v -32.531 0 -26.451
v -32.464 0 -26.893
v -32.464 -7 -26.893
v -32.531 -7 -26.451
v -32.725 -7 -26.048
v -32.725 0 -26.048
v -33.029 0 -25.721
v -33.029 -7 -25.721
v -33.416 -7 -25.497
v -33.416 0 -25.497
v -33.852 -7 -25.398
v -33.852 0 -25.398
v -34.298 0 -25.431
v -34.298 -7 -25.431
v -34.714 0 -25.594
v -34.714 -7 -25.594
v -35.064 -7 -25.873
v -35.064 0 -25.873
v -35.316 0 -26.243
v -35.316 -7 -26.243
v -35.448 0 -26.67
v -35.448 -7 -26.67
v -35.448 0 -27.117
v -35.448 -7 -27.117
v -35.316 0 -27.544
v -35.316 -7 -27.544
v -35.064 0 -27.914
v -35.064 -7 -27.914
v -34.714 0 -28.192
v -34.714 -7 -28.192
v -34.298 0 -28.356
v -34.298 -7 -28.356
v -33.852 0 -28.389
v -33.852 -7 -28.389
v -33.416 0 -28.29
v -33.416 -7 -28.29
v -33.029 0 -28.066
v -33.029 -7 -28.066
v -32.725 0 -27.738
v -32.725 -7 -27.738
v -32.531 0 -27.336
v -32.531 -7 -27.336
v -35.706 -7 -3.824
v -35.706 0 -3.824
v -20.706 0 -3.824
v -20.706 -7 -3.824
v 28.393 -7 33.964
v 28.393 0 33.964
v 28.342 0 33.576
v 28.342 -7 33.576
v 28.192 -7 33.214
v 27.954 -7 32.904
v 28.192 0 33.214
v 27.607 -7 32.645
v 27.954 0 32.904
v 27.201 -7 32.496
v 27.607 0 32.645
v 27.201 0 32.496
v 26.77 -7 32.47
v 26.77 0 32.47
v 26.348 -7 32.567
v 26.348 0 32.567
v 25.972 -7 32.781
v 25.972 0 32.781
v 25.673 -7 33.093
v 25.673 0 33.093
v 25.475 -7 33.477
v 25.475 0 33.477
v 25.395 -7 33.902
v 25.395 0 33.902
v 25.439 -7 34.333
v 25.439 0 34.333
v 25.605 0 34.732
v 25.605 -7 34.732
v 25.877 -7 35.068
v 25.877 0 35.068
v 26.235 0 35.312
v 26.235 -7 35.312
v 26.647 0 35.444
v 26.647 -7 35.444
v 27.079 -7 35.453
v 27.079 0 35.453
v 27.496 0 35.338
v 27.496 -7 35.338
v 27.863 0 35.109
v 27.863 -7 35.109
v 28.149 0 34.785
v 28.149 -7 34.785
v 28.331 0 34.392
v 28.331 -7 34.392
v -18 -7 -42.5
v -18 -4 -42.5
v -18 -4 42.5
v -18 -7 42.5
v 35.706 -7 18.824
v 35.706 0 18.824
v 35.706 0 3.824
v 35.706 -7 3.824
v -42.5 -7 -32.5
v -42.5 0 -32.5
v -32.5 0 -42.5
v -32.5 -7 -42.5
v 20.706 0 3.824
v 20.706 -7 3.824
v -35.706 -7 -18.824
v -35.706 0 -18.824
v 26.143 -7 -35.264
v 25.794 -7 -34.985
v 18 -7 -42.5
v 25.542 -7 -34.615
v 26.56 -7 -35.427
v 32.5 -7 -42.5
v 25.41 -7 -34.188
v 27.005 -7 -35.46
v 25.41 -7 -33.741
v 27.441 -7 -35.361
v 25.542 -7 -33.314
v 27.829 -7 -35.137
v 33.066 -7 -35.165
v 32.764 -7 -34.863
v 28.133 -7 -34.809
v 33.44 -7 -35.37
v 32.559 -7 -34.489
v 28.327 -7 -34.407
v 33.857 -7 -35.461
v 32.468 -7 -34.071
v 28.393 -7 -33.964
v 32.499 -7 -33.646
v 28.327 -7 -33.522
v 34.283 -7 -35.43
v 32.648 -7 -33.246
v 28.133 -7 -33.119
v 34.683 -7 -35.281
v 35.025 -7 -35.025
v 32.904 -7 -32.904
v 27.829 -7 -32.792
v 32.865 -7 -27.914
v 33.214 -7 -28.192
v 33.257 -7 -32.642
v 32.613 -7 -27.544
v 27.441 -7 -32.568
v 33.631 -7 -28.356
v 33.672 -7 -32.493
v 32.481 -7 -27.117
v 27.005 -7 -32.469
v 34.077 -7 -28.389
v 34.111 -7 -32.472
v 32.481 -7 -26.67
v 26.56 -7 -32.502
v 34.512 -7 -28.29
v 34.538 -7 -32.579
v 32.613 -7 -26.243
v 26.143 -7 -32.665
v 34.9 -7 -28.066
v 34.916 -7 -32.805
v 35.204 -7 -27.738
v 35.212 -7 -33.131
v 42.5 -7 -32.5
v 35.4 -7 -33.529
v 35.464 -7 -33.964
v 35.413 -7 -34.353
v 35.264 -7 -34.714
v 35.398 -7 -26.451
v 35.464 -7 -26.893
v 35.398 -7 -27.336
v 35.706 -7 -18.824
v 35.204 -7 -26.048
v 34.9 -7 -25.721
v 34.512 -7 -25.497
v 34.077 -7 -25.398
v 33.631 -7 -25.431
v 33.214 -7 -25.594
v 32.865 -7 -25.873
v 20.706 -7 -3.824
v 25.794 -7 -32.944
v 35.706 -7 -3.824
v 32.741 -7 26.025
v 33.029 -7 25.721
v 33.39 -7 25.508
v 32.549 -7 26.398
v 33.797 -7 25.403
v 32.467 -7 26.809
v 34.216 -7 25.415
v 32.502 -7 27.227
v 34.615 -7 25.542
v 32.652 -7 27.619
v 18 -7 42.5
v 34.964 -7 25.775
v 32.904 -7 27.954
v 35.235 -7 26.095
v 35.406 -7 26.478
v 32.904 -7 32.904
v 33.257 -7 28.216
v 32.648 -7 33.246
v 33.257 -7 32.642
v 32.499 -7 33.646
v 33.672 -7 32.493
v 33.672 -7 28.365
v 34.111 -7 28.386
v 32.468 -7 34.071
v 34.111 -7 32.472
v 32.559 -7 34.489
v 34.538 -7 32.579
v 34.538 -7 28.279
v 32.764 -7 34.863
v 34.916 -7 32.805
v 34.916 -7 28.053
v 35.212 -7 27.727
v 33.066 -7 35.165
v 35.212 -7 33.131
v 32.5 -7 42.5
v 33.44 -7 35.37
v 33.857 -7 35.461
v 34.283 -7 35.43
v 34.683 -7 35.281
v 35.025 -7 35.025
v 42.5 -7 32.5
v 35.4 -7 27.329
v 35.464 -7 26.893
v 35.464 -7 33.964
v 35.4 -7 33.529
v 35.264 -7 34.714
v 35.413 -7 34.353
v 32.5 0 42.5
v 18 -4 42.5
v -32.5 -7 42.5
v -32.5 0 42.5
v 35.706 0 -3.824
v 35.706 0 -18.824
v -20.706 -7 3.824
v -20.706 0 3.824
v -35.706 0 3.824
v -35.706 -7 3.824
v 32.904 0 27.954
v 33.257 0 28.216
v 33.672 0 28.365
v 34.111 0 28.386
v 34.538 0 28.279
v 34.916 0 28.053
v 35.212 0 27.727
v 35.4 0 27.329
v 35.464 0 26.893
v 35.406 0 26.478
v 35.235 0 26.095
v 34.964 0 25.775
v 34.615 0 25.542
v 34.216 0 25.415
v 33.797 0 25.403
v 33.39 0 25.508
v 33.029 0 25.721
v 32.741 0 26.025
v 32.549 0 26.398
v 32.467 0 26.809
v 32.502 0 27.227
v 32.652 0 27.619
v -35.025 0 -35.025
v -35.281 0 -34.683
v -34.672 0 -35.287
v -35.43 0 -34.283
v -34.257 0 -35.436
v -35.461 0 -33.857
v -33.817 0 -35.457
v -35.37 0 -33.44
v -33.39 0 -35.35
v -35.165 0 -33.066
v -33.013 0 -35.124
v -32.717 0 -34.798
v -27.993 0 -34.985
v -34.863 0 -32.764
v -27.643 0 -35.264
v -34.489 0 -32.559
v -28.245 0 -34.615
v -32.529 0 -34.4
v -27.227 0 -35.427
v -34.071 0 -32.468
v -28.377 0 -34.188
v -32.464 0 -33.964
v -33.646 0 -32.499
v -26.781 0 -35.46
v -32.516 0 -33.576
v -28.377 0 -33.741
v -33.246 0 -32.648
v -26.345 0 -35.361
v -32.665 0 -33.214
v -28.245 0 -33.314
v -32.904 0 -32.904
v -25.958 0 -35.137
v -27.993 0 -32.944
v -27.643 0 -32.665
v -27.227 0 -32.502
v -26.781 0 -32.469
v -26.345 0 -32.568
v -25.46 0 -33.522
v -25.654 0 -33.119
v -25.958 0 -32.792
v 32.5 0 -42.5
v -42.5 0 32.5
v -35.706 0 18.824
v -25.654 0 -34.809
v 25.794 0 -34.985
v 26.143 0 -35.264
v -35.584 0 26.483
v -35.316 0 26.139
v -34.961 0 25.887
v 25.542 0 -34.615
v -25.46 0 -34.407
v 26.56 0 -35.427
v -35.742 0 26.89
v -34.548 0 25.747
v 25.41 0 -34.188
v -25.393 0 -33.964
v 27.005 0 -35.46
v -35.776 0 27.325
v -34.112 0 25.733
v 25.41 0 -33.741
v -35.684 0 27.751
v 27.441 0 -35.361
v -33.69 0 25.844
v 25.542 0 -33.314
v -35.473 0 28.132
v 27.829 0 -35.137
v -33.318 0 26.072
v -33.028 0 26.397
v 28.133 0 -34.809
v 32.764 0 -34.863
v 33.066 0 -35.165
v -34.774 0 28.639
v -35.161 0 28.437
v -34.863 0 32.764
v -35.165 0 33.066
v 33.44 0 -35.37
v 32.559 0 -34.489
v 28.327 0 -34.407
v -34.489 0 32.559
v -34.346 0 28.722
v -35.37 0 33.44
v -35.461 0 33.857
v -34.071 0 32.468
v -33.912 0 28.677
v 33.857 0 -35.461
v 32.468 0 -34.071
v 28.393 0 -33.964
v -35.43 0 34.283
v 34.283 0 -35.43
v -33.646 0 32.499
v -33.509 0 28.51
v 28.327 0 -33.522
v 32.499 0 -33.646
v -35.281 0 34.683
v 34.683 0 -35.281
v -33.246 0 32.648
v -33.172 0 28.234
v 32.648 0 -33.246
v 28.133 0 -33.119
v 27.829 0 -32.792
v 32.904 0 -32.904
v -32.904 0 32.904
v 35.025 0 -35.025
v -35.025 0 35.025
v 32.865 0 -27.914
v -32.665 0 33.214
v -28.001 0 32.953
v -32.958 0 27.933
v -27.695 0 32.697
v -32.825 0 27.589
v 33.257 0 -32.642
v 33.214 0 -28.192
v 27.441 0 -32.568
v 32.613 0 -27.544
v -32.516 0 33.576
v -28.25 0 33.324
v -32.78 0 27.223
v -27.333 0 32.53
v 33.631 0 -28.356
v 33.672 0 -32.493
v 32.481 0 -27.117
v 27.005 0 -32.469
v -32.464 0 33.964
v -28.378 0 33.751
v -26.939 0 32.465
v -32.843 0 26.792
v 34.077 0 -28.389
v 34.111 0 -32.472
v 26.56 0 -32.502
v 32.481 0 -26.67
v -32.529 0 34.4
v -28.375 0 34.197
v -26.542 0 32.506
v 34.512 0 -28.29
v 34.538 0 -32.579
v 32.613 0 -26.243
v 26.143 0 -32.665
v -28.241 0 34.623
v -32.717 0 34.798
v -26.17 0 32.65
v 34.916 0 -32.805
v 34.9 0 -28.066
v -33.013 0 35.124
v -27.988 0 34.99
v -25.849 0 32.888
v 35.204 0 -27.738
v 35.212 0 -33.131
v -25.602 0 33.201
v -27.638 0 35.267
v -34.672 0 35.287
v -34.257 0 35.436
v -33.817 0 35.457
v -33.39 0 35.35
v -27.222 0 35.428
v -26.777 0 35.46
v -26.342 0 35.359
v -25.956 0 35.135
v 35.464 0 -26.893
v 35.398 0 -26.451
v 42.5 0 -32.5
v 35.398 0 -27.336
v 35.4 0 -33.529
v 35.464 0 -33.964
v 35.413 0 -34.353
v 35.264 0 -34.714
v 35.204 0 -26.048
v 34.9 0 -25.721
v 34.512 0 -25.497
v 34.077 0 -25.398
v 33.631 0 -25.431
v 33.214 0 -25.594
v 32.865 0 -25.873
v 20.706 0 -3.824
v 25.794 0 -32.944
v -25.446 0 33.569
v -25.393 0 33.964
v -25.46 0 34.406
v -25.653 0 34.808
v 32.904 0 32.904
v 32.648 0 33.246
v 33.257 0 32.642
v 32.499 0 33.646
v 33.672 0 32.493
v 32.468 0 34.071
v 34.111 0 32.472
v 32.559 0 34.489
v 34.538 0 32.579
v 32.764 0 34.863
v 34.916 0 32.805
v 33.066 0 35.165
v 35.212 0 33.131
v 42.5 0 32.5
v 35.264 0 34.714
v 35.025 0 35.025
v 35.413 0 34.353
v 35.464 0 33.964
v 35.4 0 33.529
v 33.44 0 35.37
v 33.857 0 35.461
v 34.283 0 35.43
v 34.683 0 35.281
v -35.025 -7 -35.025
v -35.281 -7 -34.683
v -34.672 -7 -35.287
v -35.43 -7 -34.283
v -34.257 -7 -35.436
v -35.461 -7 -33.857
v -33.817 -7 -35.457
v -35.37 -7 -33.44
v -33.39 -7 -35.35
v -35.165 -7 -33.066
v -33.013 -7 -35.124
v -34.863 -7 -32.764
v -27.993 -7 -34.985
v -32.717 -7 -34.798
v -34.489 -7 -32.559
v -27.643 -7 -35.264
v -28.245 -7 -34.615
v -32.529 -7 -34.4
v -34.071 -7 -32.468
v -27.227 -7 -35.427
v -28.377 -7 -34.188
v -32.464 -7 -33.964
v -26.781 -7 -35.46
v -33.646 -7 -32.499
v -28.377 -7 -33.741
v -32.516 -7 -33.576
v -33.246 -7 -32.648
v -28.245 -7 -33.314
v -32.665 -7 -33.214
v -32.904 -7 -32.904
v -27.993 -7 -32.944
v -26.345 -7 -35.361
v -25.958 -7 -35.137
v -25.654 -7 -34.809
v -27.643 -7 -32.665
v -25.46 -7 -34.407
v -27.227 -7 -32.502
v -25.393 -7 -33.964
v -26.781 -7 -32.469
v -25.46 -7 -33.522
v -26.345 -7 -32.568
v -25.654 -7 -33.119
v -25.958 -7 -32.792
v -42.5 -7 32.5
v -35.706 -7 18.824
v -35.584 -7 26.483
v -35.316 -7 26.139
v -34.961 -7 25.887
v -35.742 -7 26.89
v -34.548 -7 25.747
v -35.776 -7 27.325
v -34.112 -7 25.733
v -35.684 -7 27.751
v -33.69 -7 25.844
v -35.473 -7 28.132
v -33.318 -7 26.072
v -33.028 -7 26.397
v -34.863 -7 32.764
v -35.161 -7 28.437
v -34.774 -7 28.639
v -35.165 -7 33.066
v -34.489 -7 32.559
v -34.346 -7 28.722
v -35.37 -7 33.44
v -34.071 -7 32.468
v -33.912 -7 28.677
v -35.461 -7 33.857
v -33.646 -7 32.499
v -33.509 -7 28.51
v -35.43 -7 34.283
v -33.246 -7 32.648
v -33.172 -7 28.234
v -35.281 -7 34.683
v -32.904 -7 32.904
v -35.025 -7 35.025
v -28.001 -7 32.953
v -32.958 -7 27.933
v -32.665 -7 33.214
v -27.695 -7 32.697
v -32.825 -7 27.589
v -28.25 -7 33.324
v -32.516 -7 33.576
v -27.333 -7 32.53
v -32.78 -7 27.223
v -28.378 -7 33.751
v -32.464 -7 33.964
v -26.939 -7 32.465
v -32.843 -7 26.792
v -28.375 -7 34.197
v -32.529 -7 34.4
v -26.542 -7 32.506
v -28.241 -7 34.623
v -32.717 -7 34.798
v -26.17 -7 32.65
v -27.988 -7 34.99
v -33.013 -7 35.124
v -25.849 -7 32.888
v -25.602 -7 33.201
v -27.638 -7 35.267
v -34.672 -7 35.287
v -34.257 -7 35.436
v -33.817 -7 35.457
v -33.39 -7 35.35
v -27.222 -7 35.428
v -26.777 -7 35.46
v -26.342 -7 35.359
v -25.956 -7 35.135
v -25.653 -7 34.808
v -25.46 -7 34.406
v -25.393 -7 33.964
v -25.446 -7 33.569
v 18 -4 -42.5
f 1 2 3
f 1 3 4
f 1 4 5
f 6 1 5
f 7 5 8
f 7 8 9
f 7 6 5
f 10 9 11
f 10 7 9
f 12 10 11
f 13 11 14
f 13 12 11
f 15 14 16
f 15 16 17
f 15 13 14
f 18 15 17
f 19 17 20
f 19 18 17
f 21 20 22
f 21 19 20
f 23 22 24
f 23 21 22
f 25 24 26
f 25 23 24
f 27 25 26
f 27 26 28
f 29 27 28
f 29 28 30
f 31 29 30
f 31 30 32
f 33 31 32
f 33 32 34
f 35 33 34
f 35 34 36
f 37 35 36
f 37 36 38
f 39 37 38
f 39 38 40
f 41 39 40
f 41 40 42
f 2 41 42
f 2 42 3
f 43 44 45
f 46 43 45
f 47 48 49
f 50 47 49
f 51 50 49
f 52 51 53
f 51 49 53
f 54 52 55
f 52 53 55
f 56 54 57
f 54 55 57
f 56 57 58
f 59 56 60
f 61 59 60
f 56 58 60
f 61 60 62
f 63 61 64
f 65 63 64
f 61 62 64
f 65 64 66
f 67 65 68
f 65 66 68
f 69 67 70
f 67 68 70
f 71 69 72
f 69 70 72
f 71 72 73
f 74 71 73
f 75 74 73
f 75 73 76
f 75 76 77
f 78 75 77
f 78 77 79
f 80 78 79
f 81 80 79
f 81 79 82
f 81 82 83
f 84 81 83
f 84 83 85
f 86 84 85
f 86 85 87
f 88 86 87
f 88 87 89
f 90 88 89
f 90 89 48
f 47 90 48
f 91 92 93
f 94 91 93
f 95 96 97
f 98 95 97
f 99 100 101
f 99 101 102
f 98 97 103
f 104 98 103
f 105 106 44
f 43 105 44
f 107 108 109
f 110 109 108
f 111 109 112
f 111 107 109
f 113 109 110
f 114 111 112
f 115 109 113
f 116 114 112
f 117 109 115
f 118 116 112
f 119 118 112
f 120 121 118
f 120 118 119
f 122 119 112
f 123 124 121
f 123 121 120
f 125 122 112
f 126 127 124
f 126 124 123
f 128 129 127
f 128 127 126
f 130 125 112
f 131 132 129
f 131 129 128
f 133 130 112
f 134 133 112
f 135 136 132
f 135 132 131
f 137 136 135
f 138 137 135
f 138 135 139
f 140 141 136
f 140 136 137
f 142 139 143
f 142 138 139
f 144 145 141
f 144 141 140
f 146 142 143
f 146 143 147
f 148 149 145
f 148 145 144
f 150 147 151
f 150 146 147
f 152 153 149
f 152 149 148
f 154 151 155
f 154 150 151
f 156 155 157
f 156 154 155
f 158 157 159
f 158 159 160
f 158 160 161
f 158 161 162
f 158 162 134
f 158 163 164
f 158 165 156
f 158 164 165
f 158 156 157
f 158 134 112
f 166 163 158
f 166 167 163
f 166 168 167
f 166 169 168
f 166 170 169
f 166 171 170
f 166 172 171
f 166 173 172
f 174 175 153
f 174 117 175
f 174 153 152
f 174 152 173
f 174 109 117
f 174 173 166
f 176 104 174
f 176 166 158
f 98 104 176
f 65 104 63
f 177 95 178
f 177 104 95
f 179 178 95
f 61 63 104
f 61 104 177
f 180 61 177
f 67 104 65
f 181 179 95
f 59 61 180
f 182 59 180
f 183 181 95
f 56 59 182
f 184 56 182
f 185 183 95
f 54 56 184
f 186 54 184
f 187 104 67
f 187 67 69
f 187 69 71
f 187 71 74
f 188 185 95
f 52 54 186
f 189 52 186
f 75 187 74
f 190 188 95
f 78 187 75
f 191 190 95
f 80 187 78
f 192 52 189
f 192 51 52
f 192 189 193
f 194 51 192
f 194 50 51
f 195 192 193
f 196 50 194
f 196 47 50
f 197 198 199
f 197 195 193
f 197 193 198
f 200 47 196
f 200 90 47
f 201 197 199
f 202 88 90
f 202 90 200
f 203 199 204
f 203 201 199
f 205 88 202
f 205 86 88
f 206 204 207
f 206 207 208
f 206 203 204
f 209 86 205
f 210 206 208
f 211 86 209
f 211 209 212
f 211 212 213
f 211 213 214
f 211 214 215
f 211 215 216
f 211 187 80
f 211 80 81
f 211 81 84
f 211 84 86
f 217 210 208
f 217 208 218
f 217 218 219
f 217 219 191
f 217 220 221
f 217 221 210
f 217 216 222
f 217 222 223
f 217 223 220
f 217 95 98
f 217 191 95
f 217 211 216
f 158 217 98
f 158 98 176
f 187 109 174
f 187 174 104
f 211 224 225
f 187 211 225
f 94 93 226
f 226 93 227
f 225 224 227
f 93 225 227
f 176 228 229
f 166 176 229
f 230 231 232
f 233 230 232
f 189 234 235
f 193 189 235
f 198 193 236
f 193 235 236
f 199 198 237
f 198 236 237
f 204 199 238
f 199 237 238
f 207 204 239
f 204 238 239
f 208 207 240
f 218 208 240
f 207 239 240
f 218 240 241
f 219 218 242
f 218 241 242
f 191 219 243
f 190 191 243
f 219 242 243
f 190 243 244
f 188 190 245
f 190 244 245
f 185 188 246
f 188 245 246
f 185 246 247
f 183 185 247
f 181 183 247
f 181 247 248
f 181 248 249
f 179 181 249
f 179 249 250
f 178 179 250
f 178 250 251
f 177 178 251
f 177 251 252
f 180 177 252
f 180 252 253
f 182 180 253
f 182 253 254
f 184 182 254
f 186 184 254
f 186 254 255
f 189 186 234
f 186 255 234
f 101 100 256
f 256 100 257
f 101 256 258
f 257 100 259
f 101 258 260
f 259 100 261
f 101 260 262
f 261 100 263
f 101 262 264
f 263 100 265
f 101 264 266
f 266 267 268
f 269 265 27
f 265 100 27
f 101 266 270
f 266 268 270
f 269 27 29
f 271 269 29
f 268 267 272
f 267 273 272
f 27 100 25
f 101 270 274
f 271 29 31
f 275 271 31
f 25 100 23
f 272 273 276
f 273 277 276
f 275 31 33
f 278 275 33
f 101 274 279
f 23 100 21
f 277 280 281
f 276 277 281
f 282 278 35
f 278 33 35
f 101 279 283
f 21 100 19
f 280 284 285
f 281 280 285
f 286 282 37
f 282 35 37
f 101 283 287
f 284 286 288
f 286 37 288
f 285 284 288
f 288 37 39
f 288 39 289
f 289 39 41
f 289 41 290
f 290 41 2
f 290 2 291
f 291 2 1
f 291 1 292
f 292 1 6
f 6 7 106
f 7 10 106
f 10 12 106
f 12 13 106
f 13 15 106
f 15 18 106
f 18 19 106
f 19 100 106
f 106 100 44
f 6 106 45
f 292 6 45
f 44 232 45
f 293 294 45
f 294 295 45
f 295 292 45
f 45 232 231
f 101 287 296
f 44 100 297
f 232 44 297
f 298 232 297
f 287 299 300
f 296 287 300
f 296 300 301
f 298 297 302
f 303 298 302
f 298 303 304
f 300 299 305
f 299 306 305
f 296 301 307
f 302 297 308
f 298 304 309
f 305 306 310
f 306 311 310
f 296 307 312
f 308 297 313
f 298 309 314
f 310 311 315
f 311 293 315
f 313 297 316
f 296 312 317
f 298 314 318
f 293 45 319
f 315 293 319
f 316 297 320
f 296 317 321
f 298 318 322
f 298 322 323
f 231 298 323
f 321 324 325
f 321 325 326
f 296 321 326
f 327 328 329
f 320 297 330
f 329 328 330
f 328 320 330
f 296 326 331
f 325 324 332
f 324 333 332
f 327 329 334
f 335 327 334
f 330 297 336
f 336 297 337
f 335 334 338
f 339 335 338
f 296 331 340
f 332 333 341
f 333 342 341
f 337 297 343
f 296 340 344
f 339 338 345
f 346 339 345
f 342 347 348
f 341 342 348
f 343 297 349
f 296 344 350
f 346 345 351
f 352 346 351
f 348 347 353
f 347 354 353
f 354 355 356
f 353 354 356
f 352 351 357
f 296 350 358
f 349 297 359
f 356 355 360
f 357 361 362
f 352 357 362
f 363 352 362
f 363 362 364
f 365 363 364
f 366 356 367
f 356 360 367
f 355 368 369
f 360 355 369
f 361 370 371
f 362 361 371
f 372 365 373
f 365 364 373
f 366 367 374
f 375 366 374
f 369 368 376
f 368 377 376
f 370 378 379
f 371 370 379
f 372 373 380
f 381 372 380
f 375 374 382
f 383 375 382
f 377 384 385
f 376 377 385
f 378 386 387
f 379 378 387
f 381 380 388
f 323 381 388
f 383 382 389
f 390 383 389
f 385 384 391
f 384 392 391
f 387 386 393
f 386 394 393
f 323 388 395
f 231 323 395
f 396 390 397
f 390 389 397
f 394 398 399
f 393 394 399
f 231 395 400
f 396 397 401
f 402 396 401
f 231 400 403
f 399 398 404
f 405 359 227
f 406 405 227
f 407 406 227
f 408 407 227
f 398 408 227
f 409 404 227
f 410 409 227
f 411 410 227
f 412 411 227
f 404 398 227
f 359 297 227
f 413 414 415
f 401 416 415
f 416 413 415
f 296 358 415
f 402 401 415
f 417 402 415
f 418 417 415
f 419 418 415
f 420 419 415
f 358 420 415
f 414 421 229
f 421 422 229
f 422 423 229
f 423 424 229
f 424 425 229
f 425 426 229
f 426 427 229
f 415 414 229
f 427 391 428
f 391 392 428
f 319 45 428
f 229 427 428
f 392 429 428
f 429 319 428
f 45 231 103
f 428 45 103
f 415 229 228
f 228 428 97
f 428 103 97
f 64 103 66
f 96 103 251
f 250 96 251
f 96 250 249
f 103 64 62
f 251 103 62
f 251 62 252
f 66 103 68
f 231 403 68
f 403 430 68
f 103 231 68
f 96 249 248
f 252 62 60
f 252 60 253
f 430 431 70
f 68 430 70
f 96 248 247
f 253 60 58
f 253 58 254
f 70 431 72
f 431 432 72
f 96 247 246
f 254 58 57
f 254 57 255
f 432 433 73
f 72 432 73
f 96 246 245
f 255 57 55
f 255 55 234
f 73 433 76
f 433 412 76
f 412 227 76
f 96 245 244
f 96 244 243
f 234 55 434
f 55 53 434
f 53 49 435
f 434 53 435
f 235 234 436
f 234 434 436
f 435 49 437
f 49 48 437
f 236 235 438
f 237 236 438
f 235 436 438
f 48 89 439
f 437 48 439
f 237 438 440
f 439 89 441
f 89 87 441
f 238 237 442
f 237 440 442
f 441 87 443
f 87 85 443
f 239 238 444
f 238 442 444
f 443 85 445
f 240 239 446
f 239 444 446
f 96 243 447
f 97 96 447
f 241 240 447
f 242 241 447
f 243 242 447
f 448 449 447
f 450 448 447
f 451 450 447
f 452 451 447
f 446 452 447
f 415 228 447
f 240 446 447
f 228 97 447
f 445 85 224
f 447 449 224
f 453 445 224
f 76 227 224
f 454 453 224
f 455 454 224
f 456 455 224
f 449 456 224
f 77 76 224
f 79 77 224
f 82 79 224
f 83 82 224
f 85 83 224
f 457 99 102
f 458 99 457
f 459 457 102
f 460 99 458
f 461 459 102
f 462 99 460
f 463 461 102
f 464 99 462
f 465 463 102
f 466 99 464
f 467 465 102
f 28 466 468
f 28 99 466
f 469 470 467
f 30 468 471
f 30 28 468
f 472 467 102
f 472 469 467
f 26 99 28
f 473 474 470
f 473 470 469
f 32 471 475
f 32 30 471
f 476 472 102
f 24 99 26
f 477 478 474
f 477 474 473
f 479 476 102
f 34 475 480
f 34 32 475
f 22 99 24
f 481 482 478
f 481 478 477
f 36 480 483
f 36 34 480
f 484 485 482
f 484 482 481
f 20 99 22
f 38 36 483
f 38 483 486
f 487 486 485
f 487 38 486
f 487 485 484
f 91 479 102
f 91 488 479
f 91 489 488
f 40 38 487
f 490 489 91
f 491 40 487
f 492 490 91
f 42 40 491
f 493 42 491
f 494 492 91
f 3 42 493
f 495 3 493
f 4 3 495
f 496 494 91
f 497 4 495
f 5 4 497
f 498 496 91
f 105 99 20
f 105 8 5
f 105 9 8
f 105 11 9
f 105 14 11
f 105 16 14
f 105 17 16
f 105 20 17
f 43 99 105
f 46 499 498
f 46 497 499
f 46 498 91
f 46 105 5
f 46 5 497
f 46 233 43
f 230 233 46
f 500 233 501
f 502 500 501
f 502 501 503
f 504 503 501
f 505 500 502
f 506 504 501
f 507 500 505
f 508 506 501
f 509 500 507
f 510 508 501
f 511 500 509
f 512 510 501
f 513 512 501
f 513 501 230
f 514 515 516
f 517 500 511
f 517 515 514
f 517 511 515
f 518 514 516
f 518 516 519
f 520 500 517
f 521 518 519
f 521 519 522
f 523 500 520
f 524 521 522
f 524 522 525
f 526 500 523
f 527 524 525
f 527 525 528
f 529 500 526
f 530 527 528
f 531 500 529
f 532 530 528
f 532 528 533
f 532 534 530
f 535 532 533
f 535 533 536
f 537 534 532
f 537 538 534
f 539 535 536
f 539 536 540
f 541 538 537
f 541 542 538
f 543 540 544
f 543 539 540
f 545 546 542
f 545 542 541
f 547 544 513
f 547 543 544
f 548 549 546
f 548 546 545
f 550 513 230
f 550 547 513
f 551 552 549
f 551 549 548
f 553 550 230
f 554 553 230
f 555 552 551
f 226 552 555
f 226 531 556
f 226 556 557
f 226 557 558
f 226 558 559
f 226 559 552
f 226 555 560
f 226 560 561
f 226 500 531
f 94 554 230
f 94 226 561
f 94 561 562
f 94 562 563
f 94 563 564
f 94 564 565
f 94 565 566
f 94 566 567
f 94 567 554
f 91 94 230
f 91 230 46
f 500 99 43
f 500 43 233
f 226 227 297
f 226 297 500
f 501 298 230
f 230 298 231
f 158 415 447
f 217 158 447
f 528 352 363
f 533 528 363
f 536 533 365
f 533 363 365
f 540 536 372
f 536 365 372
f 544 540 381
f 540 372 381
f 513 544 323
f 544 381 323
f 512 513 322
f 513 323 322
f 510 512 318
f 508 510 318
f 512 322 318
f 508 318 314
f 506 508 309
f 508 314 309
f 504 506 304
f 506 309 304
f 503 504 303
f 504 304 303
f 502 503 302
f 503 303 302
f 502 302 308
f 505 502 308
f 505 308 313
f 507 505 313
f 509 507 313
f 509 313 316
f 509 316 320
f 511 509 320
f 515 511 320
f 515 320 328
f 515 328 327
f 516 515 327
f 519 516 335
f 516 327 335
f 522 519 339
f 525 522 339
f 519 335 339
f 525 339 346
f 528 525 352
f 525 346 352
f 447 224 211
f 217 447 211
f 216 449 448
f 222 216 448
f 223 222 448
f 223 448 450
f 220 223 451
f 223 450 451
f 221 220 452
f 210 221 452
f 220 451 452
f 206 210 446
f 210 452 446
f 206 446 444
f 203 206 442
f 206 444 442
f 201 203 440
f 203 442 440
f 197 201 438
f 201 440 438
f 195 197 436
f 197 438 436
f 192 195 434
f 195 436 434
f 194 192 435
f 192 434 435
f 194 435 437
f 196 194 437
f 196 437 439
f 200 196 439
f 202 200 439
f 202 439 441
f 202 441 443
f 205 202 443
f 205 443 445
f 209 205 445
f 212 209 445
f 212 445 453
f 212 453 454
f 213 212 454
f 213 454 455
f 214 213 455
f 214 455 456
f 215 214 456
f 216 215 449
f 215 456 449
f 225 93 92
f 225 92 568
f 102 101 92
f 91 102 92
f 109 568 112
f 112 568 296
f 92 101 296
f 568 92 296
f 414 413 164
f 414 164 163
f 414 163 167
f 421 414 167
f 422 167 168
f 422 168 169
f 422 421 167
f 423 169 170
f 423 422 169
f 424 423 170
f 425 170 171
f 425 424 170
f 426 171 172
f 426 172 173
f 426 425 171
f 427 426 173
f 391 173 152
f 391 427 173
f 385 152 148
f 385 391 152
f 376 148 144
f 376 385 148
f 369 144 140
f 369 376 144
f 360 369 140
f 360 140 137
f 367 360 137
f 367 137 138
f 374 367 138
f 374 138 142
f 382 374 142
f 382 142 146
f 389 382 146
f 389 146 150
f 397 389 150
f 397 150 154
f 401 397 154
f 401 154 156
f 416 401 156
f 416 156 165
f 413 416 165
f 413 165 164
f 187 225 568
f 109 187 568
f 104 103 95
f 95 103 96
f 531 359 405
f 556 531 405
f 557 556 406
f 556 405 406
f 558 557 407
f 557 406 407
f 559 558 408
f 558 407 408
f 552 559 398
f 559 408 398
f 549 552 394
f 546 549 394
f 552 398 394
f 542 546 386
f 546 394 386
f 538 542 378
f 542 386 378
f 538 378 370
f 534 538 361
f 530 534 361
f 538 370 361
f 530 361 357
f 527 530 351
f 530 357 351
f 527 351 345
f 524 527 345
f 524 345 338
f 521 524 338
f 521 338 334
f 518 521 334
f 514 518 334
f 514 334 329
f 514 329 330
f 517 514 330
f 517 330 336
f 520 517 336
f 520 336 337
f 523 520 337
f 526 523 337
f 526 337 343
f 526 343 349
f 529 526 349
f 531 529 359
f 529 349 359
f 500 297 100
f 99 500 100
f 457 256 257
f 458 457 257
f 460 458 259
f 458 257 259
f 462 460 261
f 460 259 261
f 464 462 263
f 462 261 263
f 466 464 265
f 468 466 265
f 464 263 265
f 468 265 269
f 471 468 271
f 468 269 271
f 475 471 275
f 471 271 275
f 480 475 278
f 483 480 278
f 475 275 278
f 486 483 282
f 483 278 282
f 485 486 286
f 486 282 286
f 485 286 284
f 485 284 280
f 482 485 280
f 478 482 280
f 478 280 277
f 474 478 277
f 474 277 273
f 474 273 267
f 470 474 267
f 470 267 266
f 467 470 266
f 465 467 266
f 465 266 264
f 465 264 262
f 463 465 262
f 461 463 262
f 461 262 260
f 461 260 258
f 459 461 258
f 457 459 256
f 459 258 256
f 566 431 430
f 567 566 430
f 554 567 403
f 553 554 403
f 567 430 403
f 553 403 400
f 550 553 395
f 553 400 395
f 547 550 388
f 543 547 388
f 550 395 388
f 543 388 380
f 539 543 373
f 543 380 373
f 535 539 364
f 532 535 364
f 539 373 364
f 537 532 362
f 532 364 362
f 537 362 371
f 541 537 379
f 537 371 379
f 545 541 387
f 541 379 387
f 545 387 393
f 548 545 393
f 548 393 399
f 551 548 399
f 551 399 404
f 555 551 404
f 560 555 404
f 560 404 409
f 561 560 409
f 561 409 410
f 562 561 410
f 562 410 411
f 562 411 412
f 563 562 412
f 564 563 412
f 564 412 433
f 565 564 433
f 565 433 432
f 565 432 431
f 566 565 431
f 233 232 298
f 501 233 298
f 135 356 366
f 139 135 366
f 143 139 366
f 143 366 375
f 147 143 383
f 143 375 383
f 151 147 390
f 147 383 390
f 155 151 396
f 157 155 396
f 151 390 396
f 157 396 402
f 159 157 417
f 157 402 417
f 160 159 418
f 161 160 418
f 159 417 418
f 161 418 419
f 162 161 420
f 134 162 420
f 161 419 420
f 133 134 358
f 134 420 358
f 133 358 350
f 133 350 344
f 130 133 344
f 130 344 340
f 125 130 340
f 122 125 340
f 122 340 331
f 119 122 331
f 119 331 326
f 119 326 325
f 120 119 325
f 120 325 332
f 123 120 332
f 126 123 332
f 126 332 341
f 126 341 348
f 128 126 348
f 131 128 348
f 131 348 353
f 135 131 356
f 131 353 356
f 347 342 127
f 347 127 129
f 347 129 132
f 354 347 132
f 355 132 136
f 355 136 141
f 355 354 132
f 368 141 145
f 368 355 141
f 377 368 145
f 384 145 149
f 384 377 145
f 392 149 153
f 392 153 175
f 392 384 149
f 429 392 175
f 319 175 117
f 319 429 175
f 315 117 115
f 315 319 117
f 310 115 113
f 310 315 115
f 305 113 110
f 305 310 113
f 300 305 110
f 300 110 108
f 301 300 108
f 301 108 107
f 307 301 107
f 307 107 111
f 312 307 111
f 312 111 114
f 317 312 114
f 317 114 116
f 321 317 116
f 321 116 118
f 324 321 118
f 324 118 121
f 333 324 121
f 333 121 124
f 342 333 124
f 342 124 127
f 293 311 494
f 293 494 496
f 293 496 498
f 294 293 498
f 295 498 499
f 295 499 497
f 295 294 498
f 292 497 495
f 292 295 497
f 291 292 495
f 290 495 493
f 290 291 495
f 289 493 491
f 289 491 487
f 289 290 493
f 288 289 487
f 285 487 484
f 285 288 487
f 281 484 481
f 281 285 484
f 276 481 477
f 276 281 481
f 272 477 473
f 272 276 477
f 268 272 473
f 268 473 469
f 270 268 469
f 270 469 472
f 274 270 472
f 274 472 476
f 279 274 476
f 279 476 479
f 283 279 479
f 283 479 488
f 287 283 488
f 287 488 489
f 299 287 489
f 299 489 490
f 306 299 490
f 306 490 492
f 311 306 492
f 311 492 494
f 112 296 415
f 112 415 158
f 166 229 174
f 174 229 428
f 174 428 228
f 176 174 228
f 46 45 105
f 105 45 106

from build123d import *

# Parameters (mm, degrees)
F0_R     = 1.5
F0_W     = 36
F0_H     = 85
F1_DEPTH = 4
F2_SIZE  = 10
F3_DEPTH = 7


with BuildPart() as f1:
    # F0 (on Front) → F1 (new body)
    with BuildSketch(Plane.XZ):
        Polygon((42.5, 32.5), (42.5, 42.5), (37.5, 37.5), align=None)
        Polygon((37.5, 37.5), (42.5, 42.5), (32.5, 42.5), align=None)
        Polygon((42.5, -32.5), (42.5, 32.5), (37.5, 37.5), (32.5, 42.5), (18, 42.5), (18, -42.5), (32.5, -42.5), (37.5, -37.5), align=None)
        with Locations((26.8933982822, -33.9644660941)):
            Circle(F0_R, mode=Mode.SUBTRACT)
        with BuildLine():
            ThreePointArc((35.4644660941, -33.9644660941), (35.3502853928, -34.5384912426), (35.0251262658, -35.0251262658))
            ThreePointArc((35.0251262658, -35.0251262658), (32.9038059223, -35.0251262658), (32.9038059223, -32.9038059223))
            ThreePointArc((32.9038059223, -32.9038059223), (34.5384912426, -32.5786467953), (35.4644660941, -33.9644660941))
        make_face(mode=Mode.SUBTRACT)
        with Locations((33.9644660941, -26.8933982822)):
            Circle(F0_R, mode=Mode.SUBTRACT)
        Polygon((20.7055291533, -3.823871389), (35.7055291533, -3.823871389), (35.7055291533, -18.823871389), align=None, mode=Mode.SUBTRACT)
        Polygon((35.7055291533, 3.823871389), (20.7055291533, 3.823871389), (35.7055291533, 18.823871389), align=None, mode=Mode.SUBTRACT)
        with BuildLine():
            ThreePointArc((35.4644660941, 26.8933982822), (33.3904409455, 25.5075789834), (32.9038059223, 27.954058454))
            ThreePointArc((32.9038059223, 27.954058454), (34.5384912426, 28.279217581), (35.4644660941, 26.8933982822))
        make_face(mode=Mode.SUBTRACT)
        with BuildLine():
            ThreePointArc((28.3933982822, 33.9644660941), (28.279217581, 33.3904409455), (27.954058454, 32.9038059223))
            ThreePointArc((27.954058454, 32.9038059223), (25.5075789834, 34.5384912426), (28.3933982822, 33.9644660941))
        make_face(mode=Mode.SUBTRACT)
        with BuildLine():
            ThreePointArc((32.9038059223, 32.9038059223), (32.9038059223, 35.0251262658), (35.0251262658, 35.0251262658))
            ThreePointArc((35.0251262658, 35.0251262658), (35.3502853928, 34.5384912426), (35.4644660941, 33.9644660941))
            ThreePointArc((35.4644660941, 33.9644660941), (34.5384912426, 32.5786467953), (32.9038059223, 32.9038059223))
        make_face(mode=Mode.SUBTRACT)
        Polygon((42.5, -42.5), (42.5, -32.5), (37.5, -37.5), align=None)
        Rectangle(F0_W, F0_H)
        Polygon((32.5, -42.5), (42.5, -42.5), (37.5, -37.5), align=None)
        Polygon((-18, -42.5), (-18, 42.5), (-32.5, 42.5), (-37.5, 37.5), (-42.5, 32.5), (-42.5, -32.5), (-37.5, -37.5), (-32.5, -42.5), align=None)
        with BuildLine():
            ThreePointArc((-32.4644660941, -33.9644660941), (-33.3904409455, -35.3502853928), (-35.0251262658, -35.0251262658))
            ThreePointArc((-35.0251262658, -35.0251262658), (-35.0251262658, -32.9038059223), (-32.9038059223, -32.9038059223))
            ThreePointArc((-32.9038059223, -32.9038059223), (-32.5786467953, -33.3904409455), (-32.4644660941, -33.9644660941))
        make_face(mode=Mode.SUBTRACT)
        with Locations((-26.8933982822, -33.9644660941)):
            Circle(F0_R, mode=Mode.SUBTRACT)
        with Locations((-33.9644660941, -26.8933982822)):
            Circle(F0_R, mode=Mode.SUBTRACT)
        Polygon((-20.7055291533, -3.823871389), (-35.7055291533, -18.823871389), (-35.7055291533, -3.823871389), align=None, mode=Mode.SUBTRACT)
        Polygon((-35.7055291533, 3.823871389), (-35.7055291533, 18.823871389), (-20.7055291533, 3.823871389), align=None, mode=Mode.SUBTRACT)
        with BuildLine():
            ThreePointArc((-32.7795228992, 27.2231633162), (-35.6780717969, 26.6808894181), (-33.1716042066, 28.2343587329))
            ThreePointArc((-33.1716042066, 28.2343587329), (-32.8809740014, 27.7654372144), (-32.7795228992, 27.2231633162))
        make_face(mode=Mode.SUBTRACT)
        with BuildLine():
            ThreePointArc((-32.9038059223, 32.9038059223), (-35.0251262658, 32.9038059223), (-35.0251262658, 35.0251262658))
            ThreePointArc((-35.0251262658, 35.0251262658), (-33.3904409455, 35.3502853928), (-32.4644660941, 33.9644660941))
            ThreePointArc((-32.4644660941, 33.9644660941), (-32.5786467953, 33.3904409455), (-32.9038059223, 32.9038059223))
        make_face(mode=Mode.SUBTRACT)
        with BuildLine():
            ThreePointArc((-25.3933982822, 33.9644660941), (-26.3511243841, 32.5659171963), (-28.0013169747, 32.9532706774))
            ThreePointArc((-28.0013169747, 32.9532706774), (-27.4356721803, 35.3630149918), (-25.3933982822, 33.9644660941))
        make_face(mode=Mode.SUBTRACT)
        Polygon((-37.5, 37.5), (-32.5, 42.5), (-42.5, 42.5), align=None)
        Polygon((-42.5, 32.5), (-37.5, 37.5), (-42.5, 42.5), align=None)
        Polygon((-42.5, -42.5), (-32.5, -42.5), (-37.5, -37.5), align=None)
        Polygon((-42.5, -42.5), (-37.5, -37.5), (-42.5, -32.5), align=None)
    extrude(amount=F1_DEPTH)

    # F2
    f2_edges = [f1.edges().sort_by_distance(p)[0] for p in [
        (42.5, -2, 42.5),
        (-42.5, -2, 42.5),
        (-42.5, -2, -42.5),
        (42.5, -2, -42.5),
    ]]
    chamfer(f2_edges, length=F2_SIZE)

    # F0 (on Front) → F3 (join)
    with BuildSketch(Plane.XZ):
        Polygon((-18, -42.5), (-18, 42.5), (-32.5, 42.5), (-37.5, 37.5), (-42.5, 32.5), (-42.5, -32.5), (-37.5, -37.5), (-32.5, -42.5), align=None)
        with BuildLine():
            ThreePointArc((-32.4644660941, -33.9644660941), (-33.3904409455, -35.3502853928), (-35.0251262658, -35.0251262658))
            ThreePointArc((-35.0251262658, -35.0251262658), (-35.0251262658, -32.9038059223), (-32.9038059223, -32.9038059223))
            ThreePointArc((-32.9038059223, -32.9038059223), (-32.5786467953, -33.3904409455), (-32.4644660941, -33.9644660941))
        make_face(mode=Mode.SUBTRACT)
        with Locations((-26.8933982822, -33.9644660941)):
            Circle(F0_R, mode=Mode.SUBTRACT)
        with Locations((-33.9644660941, -26.8933982822)):
            Circle(F0_R, mode=Mode.SUBTRACT)
        Polygon((-20.7055291533, -3.823871389), (-35.7055291533, -18.823871389), (-35.7055291533, -3.823871389), align=None, mode=Mode.SUBTRACT)
        Polygon((-35.7055291533, 3.823871389), (-35.7055291533, 18.823871389), (-20.7055291533, 3.823871389), align=None, mode=Mode.SUBTRACT)
        with BuildLine():
            ThreePointArc((-32.7795228992, 27.2231633162), (-35.6780717969, 26.6808894181), (-33.1716042066, 28.2343587329))
            ThreePointArc((-33.1716042066, 28.2343587329), (-32.8809740014, 27.7654372144), (-32.7795228992, 27.2231633162))
        make_face(mode=Mode.SUBTRACT)
        with BuildLine():
            ThreePointArc((-32.9038059223, 32.9038059223), (-35.0251262658, 32.9038059223), (-35.0251262658, 35.0251262658))
            ThreePointArc((-35.0251262658, 35.0251262658), (-33.3904409455, 35.3502853928), (-32.4644660941, 33.9644660941))
            ThreePointArc((-32.4644660941, 33.9644660941), (-32.5786467953, 33.3904409455), (-32.9038059223, 32.9038059223))
        make_face(mode=Mode.SUBTRACT)
        with BuildLine():
            ThreePointArc((-25.3933982822, 33.9644660941), (-26.3511243841, 32.5659171963), (-28.0013169747, 32.9532706774))
            ThreePointArc((-28.0013169747, 32.9532706774), (-27.4356721803, 35.3630149918), (-25.3933982822, 33.9644660941))
        make_face(mode=Mode.SUBTRACT)
        Polygon((42.5, -32.5), (42.5, 32.5), (37.5, 37.5), (32.5, 42.5), (18, 42.5), (18, -42.5), (32.5, -42.5), (37.5, -37.5), align=None)
        with Locations((26.8933982822, -33.9644660941)):
            Circle(F0_R, mode=Mode.SUBTRACT)
        with BuildLine():
            ThreePointArc((35.4644660941, -33.9644660941), (35.3502853928, -34.5384912426), (35.0251262658, -35.0251262658))
            ThreePointArc((35.0251262658, -35.0251262658), (32.9038059223, -35.0251262658), (32.9038059223, -32.9038059223))
            ThreePointArc((32.9038059223, -32.9038059223), (34.5384912426, -32.5786467953), (35.4644660941, -33.9644660941))
        make_face(mode=Mode.SUBTRACT)
        with Locations((33.9644660941, -26.8933982822)):
            Circle(F0_R, mode=Mode.SUBTRACT)
        Polygon((20.7055291533, -3.823871389), (35.7055291533, -3.823871389), (35.7055291533, -18.823871389), align=None, mode=Mode.SUBTRACT)
        Polygon((35.7055291533, 3.823871389), (20.7055291533, 3.823871389), (35.7055291533, 18.823871389), align=None, mode=Mode.SUBTRACT)
        with BuildLine():
            ThreePointArc((35.4644660941, 26.8933982822), (33.3904409455, 25.5075789834), (32.9038059223, 27.954058454))
            ThreePointArc((32.9038059223, 27.954058454), (34.5384912426, 28.279217581), (35.4644660941, 26.8933982822))
        make_face(mode=Mode.SUBTRACT)
        with BuildLine():
            ThreePointArc((28.3933982822, 33.9644660941), (28.279217581, 33.3904409455), (27.954058454, 32.9038059223))
            ThreePointArc((27.954058454, 32.9038059223), (25.5075789834, 34.5384912426), (28.3933982822, 33.9644660941))
        make_face(mode=Mode.SUBTRACT)
        with BuildLine():
            ThreePointArc((32.9038059223, 32.9038059223), (32.9038059223, 35.0251262658), (35.0251262658, 35.0251262658))
            ThreePointArc((35.0251262658, 35.0251262658), (35.3502853928, 34.5384912426), (35.4644660941, 33.9644660941))
            ThreePointArc((35.4644660941, 33.9644660941), (34.5384912426, 32.5786467953), (32.9038059223, 32.9038059223))
        make_face(mode=Mode.SUBTRACT)
    extrude(amount=F3_DEPTH)


solid = f1.part
